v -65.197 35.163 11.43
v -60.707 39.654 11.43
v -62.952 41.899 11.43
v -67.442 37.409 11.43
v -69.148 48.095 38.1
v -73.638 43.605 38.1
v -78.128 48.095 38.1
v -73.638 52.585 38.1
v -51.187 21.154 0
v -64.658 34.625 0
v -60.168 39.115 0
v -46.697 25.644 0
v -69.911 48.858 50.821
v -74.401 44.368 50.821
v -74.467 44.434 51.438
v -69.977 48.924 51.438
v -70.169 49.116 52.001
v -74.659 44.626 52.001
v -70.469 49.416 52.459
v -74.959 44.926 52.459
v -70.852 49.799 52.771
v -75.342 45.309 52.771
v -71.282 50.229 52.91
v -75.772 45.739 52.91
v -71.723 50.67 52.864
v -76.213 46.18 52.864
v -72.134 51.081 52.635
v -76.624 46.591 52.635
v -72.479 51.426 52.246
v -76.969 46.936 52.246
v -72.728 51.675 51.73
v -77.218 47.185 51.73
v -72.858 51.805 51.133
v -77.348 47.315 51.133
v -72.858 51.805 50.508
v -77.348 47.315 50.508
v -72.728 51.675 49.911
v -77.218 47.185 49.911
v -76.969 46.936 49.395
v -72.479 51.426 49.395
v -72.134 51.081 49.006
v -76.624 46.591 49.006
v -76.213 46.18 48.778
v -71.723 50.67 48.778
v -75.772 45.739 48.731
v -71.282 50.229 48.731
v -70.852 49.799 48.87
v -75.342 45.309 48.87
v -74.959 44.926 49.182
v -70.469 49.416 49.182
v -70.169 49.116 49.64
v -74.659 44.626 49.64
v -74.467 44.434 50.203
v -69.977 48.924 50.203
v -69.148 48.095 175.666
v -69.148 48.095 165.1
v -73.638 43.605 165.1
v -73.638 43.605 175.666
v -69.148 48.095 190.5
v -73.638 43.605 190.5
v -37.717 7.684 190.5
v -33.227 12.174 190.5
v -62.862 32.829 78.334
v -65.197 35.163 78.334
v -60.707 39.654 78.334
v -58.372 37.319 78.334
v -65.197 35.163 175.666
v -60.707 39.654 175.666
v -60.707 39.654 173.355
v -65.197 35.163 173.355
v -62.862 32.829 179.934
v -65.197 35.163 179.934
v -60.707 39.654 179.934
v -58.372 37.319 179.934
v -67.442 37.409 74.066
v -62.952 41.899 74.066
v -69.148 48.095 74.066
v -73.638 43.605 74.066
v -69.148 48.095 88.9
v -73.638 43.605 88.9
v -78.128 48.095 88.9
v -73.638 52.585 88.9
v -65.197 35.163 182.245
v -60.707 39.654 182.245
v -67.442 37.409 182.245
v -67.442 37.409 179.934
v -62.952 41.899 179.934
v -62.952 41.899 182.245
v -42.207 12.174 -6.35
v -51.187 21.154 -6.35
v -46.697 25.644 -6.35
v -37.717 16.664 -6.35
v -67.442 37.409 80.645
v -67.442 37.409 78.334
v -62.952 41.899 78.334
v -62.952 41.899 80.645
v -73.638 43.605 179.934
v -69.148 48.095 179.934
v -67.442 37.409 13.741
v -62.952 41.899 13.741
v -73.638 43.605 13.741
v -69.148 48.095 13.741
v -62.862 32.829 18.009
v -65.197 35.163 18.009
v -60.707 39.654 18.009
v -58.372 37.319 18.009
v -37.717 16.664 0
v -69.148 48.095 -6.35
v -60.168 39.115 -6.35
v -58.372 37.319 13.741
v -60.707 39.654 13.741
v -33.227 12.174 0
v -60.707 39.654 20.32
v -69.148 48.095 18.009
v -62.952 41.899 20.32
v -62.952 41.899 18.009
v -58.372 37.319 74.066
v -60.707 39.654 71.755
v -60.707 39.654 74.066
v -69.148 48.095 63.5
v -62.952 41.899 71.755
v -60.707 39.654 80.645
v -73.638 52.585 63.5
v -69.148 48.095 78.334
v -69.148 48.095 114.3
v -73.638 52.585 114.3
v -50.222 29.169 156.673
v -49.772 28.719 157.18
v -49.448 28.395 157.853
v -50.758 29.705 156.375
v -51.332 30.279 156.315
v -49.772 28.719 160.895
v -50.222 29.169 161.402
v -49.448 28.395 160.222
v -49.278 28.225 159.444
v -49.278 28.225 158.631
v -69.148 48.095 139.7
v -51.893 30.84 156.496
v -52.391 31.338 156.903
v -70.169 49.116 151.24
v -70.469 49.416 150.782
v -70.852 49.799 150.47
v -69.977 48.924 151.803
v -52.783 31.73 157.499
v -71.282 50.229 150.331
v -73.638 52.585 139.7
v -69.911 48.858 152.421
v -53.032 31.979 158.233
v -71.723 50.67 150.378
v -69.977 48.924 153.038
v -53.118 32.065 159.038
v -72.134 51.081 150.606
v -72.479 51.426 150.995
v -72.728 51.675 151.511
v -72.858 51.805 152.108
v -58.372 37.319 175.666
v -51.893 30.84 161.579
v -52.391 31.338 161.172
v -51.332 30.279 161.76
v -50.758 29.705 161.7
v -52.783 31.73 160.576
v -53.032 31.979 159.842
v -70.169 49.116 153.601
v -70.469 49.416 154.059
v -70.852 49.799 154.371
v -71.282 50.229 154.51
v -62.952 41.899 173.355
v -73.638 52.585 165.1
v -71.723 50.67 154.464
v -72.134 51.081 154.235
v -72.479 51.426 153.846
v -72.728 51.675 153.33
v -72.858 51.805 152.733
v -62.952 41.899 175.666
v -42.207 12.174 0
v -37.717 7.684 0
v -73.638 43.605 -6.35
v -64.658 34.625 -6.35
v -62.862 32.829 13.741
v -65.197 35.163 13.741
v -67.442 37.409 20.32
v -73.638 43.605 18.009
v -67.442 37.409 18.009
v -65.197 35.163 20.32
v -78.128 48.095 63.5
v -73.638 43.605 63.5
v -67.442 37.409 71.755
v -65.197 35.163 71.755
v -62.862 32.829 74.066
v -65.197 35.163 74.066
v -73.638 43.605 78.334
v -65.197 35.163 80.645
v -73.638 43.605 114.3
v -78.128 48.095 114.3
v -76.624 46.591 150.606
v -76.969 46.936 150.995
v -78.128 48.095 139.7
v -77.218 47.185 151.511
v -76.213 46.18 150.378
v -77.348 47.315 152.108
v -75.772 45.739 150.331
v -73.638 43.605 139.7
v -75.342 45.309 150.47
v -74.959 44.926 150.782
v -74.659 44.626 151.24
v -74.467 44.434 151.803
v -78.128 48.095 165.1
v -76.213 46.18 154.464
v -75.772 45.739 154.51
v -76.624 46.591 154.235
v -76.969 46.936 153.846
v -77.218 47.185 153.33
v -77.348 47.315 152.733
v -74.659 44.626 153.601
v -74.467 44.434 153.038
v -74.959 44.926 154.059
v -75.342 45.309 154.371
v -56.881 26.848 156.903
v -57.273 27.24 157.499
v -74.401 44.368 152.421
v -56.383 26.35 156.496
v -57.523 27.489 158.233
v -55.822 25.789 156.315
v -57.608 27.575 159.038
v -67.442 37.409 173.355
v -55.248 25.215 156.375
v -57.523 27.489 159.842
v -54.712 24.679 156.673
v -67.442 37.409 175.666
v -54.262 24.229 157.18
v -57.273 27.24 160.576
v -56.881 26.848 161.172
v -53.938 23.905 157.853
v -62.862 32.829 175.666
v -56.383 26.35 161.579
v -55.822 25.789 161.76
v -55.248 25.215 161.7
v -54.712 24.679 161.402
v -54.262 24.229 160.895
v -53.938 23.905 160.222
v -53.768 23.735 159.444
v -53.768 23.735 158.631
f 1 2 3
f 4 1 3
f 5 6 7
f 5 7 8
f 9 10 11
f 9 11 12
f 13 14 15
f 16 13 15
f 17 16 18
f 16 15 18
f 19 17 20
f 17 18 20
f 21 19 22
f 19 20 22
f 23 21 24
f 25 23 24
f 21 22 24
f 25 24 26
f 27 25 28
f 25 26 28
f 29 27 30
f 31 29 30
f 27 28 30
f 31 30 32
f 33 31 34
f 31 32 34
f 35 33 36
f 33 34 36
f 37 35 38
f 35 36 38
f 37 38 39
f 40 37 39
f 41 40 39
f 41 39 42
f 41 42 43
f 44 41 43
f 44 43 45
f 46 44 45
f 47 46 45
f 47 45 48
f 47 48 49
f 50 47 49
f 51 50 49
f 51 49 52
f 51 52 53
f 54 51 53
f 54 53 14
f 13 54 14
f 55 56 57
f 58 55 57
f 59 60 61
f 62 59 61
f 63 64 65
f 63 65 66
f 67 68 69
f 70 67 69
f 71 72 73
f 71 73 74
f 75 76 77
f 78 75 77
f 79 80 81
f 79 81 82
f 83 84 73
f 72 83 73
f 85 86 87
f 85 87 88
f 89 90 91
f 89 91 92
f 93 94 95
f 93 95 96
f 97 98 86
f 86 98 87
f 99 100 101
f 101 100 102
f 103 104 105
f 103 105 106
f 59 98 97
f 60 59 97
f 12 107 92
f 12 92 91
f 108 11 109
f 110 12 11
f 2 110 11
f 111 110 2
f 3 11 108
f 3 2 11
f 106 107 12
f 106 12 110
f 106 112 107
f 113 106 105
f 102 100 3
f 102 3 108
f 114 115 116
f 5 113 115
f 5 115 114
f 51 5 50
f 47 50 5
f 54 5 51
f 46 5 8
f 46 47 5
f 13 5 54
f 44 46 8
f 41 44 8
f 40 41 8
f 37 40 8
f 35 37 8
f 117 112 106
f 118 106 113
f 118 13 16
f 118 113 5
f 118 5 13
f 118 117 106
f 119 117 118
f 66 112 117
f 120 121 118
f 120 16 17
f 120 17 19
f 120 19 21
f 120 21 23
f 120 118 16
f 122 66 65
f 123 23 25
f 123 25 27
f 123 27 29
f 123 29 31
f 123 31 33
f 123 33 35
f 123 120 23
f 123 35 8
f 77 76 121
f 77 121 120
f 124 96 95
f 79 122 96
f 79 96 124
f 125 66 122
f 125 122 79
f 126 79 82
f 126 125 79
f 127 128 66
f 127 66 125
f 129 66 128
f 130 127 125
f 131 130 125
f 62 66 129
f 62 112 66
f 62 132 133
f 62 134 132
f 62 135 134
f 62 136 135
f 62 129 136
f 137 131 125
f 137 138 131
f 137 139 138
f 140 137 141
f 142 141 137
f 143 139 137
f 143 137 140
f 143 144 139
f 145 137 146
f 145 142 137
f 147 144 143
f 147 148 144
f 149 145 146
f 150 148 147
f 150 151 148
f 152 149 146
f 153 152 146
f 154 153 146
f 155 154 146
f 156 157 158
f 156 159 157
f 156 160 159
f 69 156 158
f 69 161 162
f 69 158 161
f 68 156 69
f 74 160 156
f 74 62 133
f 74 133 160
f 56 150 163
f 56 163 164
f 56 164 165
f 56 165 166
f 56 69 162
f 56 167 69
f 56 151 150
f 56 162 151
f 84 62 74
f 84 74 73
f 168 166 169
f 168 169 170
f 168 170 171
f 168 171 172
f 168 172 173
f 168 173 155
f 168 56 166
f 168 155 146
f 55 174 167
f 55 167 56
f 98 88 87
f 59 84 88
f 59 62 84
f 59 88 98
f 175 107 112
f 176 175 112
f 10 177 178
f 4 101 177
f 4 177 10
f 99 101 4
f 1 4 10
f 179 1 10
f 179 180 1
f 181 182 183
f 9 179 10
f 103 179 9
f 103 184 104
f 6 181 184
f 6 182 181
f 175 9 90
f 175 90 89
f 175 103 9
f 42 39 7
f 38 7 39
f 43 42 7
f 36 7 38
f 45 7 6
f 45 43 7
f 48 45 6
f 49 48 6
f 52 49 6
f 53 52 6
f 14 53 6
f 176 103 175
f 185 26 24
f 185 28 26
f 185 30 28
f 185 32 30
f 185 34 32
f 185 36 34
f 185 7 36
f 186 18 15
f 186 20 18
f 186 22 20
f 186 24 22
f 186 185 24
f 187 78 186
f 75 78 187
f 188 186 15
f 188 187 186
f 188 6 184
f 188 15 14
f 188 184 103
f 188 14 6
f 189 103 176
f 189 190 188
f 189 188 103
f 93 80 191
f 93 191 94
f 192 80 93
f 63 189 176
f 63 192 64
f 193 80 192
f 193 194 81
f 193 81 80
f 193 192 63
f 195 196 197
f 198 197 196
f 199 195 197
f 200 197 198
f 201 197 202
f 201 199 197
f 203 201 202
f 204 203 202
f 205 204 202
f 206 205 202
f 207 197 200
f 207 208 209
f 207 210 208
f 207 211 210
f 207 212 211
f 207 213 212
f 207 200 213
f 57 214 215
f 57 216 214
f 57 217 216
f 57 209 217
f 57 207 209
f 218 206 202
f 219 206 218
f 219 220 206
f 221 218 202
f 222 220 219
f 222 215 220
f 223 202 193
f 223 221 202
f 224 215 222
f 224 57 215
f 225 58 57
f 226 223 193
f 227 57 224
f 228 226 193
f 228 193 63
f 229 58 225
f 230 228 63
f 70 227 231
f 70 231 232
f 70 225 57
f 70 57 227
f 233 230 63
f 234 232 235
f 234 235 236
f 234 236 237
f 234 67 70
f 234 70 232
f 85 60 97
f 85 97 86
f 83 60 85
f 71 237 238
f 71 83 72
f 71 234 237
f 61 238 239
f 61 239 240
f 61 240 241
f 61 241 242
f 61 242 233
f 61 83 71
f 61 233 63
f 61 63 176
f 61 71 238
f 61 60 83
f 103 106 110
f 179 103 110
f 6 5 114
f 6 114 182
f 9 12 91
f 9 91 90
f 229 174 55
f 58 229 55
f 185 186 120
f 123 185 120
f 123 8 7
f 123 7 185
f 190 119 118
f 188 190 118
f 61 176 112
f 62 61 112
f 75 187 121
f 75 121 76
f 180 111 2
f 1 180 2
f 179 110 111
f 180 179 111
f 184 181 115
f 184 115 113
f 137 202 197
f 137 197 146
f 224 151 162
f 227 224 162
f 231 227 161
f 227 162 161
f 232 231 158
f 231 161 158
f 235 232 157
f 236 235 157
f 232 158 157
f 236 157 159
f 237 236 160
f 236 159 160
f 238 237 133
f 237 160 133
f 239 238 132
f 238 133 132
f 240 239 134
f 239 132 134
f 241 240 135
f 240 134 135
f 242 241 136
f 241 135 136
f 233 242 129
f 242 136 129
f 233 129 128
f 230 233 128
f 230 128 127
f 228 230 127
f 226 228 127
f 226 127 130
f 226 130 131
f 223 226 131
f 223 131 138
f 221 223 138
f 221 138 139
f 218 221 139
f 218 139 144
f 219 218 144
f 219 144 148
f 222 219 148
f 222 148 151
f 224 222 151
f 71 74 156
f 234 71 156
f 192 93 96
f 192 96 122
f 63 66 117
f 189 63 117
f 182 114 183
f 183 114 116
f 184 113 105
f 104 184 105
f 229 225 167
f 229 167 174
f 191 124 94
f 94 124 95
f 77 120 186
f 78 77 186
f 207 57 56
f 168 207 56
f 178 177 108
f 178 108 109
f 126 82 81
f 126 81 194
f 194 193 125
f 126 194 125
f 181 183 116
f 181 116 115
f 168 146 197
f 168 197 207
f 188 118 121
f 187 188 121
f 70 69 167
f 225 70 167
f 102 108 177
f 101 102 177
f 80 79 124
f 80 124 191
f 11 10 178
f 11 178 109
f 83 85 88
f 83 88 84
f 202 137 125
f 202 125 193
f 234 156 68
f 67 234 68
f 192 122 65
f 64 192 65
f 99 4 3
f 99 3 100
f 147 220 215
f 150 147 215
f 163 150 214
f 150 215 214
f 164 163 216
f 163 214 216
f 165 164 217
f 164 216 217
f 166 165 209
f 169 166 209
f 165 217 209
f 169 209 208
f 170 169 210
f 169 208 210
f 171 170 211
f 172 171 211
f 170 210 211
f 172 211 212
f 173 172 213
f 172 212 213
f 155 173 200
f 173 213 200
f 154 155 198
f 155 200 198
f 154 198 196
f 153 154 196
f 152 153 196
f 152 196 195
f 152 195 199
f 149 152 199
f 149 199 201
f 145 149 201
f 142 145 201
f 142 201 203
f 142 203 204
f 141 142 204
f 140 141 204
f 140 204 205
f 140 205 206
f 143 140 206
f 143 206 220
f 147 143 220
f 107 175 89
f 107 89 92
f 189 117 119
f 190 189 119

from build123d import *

# Parameters (mm, degrees)
BOSS_EXTRUDE1_DEPTH = 190.5
SKETCH2_W           = 25.4
SKETCH2_H           = 6.35
BOSS_EXTRUDE2_DEPTH = 6.35
LPATTERN1_COUNT     = 3
LPATTERN1_PITCH     = 50.8
BOSS_EXTRUDE3_DEPTH = 6.35
LPATTERN2_COUNT     = 2
LPATTERN2_PITCH     = 31.75
SKETCH4_R           = 2.7305
CUT_EXTRUDE1_DEPTH  = 212.762427449
CUT_EXTRUDE2_DEPTH  = 212.762427449
SKETCH6_R           = 2.0955
CUT_EXTRUDE3_DEPTH  = 212.762427449


with BuildPart() as part:
    # Sketch1 → Boss-Extrude1 (new body)
    with BuildSketch(Plane.XY):
        Polygon((-73.638100193, 43.604904797), (-37.717075708, 7.683880312), (-33.226947648, 12.174008373), (-69.147972132, 48.095032857), align=None)
    extrude(amount=BOSS_EXTRUDE1_DEPTH)

    # Sketch2 → Boss-Extrude2 (add)
    with BuildSketch(Plane(origin=(-58.621502495, 58.621502495, 0), x_dir=(0, 0, 1), z_dir=(-0.7071067811865471, 0.7071067811865479, 0))):
        with Locations((152.4, -18.061676125)):
            Rectangle(SKETCH2_W, SKETCH2_H)
    boss_extrude2 = extrude(amount=BOSS_EXTRUDE2_DEPTH)

    # LPattern1: Boss-Extrude2 ×3
    with Locations(*[(0, 0, -i * LPATTERN1_PITCH) for i in range(1, LPATTERN1_COUNT)]):
        add(boss_extrude2)

    # Sketch3 → Boss-Extrude3 (add)
    with BuildSketch(Plane(origin=(0, 0, 0), x_dir=(-1, 0, 0), z_dir=(0, 0, -1))):
        Polygon((73.638100193, 43.604904797), (64.657844072, 34.624648676), (60.167716011, 39.114776736), (69.147972132, 48.095032857), align=None)
    boss_extrude3 = extrude(amount=BOSS_EXTRUDE3_DEPTH)

    # LPattern2: Boss-Extrude3 ×2
    with Locations(*[Vector(0.7071067811865476, -0.7071067811865476, 0) * (i * LPATTERN2_PITCH) for i in range(1, LPATTERN2_COUNT)]):
        add(boss_extrude3)

    # Sketch4 → Cut-Extrude1 (cut, through all)
    with BuildSketch(Plane(origin=(-10.526469638, -10.526469638, 0), x_dir=(0, 0, -1), z_dir=(0.7071067811865482, 0.7071067811865468, 0))):
        with Locations(Location((-159.0375, 57.503323875, 0), (0, 0, 90))):
            Circle(SKETCH4_R)
    extrude(amount=-CUT_EXTRUDE1_DEPTH, mode=Mode.SUBTRACT)

    # Sketch5 → Cut-Extrude2 (cut, through all)
    with BuildSketch(Plane(origin=(-10.526469638, -10.526469638, 0), x_dir=(0, 0, -1), z_dir=(0.7071067811865487, 0.7071067811865465, 0))):
        Polygon((-175.6664, 82.903323875), (-179.9336, 82.903323875), (-179.9336, 74.140323875), (-182.245, 74.140323875), (-182.245, 70.965323875), (-179.9336, 70.965323875), (-179.9336, 67.663323875), (-175.6664, 67.663323875), (-175.6664, 70.965323875), (-173.355, 70.965323875), (-173.355, 74.140323875), (-175.6664, 74.140323875), align=None)
        Polygon((-74.0664, 82.903323875), (-78.3336, 82.903323875), (-78.3336, 74.140323875), (-80.645, 74.140323875), (-80.645, 70.965323875), (-78.3336, 70.965323875), (-78.3336, 67.663323875), (-74.0664, 67.663323875), (-74.0664, 70.965323875), (-71.755, 70.965323875), (-71.755, 74.140323875), (-74.0664, 74.140323875), align=None)
        Polygon((-13.7414, 82.903323875), (-18.0086, 82.903323875), (-18.0086, 74.140323875), (-20.32, 74.140323875), (-20.32, 70.965323875), (-18.0086, 70.965323875), (-18.0086, 67.663323875), (-13.7414, 67.663323875), (-13.7414, 70.965323875), (-11.43, 70.965323875), (-11.43, 74.140323875), (-13.7414, 74.140323875), align=None)
    extrude(amount=-CUT_EXTRUDE2_DEPTH, mode=Mode.SUBTRACT)

    # Sketch6 → Cut-Extrude3 (cut, through all)
    with BuildSketch(Plane(origin=(-15.016597698, -15.016597698, 0), x_dir=(0, 0, 1), z_dir=(-0.7071067811865486, -0.7071067811865465, 0))):
        with Locations(Location((152.42060291, 86.078323875, 0), (0, 0, 270))):
            Circle(SKETCH6_R)
        with Locations(Location((50.82060291, 86.078323875, 0), (0, 0, 270))):
            Circle(SKETCH6_R)
    extrude(amount=-CUT_EXTRUDE3_DEPTH, mode=Mode.SUBTRACT)


solid = part.part
